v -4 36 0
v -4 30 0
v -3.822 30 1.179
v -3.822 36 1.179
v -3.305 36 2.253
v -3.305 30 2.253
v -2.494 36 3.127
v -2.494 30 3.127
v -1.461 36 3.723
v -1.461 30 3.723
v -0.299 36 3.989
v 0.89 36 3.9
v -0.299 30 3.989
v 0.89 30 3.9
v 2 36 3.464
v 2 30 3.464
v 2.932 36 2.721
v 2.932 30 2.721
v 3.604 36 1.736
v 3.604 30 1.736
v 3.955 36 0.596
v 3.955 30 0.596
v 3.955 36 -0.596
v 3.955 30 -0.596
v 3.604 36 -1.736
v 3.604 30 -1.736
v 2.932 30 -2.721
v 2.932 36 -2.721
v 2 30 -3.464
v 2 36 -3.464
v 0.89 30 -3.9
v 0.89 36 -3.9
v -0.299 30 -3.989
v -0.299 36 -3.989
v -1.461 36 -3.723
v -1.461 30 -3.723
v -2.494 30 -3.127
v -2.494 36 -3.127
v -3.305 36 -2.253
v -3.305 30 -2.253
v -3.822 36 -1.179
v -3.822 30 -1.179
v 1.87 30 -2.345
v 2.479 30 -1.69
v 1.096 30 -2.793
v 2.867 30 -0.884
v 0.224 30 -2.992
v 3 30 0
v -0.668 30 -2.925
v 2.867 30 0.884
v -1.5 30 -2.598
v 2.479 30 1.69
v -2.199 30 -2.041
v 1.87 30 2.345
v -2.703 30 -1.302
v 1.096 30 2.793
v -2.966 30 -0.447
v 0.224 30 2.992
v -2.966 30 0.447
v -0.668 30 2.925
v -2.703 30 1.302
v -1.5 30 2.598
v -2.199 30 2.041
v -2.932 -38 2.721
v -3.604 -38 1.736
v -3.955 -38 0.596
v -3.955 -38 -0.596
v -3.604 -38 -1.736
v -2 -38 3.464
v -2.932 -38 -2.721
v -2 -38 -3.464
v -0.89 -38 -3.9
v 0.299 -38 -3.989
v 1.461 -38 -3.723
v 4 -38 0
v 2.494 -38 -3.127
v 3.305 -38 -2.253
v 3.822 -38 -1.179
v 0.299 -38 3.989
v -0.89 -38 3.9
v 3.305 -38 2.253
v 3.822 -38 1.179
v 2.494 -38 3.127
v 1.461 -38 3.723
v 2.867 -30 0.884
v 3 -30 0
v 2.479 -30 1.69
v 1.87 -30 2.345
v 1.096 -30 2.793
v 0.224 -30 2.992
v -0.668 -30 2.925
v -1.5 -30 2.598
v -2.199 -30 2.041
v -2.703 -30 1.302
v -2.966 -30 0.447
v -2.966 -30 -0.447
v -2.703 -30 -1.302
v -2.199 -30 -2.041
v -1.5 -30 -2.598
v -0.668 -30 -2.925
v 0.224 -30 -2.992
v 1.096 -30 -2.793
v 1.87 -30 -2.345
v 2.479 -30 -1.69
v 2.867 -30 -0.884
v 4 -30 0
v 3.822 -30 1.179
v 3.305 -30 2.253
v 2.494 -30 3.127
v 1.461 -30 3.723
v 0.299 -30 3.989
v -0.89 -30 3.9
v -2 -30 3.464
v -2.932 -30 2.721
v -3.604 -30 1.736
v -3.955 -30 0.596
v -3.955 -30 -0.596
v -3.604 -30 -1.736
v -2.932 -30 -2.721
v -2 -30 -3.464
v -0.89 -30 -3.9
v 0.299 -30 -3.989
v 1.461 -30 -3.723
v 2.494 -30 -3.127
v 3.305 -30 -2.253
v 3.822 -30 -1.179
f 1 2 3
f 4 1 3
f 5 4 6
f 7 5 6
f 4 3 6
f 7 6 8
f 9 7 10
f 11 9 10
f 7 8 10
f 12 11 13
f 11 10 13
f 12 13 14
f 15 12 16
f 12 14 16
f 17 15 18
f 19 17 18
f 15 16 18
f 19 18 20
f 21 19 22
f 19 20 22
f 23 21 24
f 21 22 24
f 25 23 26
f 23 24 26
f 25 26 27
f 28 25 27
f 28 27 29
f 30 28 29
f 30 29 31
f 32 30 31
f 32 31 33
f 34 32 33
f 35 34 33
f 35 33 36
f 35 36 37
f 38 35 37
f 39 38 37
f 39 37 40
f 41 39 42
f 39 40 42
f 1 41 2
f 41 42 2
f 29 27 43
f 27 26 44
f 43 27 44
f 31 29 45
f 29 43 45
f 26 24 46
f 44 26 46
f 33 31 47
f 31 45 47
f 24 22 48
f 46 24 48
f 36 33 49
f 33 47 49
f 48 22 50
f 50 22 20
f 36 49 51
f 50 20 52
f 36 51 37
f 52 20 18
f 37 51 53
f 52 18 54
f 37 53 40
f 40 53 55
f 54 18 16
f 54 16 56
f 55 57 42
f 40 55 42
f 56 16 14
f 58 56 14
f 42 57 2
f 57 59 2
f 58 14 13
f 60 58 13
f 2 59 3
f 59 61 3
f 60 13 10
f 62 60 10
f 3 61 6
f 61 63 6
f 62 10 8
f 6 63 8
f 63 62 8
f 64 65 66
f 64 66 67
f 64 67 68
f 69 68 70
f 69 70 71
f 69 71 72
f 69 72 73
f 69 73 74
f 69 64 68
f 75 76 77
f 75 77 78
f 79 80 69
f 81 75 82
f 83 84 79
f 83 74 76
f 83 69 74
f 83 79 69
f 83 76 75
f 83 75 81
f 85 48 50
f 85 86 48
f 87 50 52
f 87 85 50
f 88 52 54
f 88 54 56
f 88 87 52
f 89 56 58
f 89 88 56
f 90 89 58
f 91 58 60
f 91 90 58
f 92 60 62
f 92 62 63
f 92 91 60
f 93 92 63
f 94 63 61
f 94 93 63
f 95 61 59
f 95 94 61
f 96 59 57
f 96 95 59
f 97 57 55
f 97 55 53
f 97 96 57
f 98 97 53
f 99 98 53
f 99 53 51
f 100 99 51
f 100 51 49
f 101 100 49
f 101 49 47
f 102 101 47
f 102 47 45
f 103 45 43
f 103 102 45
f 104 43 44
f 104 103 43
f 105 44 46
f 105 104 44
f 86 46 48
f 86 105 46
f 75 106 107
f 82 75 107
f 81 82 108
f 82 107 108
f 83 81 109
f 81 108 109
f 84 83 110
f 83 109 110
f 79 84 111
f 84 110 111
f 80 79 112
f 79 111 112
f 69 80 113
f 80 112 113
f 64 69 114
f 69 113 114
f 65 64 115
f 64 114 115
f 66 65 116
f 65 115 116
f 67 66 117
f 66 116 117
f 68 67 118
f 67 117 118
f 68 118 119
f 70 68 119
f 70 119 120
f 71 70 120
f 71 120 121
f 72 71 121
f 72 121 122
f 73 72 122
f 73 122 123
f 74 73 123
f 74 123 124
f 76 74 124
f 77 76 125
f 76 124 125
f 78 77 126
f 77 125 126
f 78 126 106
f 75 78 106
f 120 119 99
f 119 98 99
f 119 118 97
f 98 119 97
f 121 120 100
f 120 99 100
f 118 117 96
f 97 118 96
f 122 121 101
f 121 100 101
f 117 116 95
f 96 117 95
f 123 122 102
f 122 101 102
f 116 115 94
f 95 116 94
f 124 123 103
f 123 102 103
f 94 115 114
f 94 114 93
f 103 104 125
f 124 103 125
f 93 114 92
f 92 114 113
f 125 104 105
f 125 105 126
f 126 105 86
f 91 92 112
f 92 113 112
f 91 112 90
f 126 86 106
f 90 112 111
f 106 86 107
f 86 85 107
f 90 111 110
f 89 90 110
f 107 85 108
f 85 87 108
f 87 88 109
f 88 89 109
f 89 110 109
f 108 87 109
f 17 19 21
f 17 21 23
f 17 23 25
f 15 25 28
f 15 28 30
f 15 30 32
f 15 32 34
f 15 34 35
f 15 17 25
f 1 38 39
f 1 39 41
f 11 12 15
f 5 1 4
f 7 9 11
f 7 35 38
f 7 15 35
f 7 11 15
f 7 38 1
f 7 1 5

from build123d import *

# Parameters (mm, degrees)
F0_R     = 3
F1_DEPTH = 30
F3_R     = 4
F3_R_2   = 3
F4_DEPTH = 6
F2_R     = 4
F2_R_2   = 3
F5_DEPTH = 8


with BuildPart() as f1:
    # F0 (on Front) → F1 (new body, symmetric)
    with BuildSketch(Plane.XZ):
        Circle(F0_R)
    extrude(amount=F1_DEPTH, both=True)

    # F3 (on face) → F4 (join)
    with BuildSketch(Plane(origin=(0, 30, 0), x_dir=(-1, 0, 0), z_dir=(0, 1, 0))):
        Circle(F3_R)
        Circle(F3_R_2, mode=Mode.SUBTRACT)
        Circle(F3_R_2)
    extrude(amount=F4_DEPTH)

    # F2 (on face) → F5 (join)
    with BuildSketch(Plane.XZ.offset(30)):
        Circle(F2_R)
        Circle(F2_R_2, mode=Mode.SUBTRACT)
        Circle(F2_R_2)
    extrude(amount=F5_DEPTH)


solid = f1.part
